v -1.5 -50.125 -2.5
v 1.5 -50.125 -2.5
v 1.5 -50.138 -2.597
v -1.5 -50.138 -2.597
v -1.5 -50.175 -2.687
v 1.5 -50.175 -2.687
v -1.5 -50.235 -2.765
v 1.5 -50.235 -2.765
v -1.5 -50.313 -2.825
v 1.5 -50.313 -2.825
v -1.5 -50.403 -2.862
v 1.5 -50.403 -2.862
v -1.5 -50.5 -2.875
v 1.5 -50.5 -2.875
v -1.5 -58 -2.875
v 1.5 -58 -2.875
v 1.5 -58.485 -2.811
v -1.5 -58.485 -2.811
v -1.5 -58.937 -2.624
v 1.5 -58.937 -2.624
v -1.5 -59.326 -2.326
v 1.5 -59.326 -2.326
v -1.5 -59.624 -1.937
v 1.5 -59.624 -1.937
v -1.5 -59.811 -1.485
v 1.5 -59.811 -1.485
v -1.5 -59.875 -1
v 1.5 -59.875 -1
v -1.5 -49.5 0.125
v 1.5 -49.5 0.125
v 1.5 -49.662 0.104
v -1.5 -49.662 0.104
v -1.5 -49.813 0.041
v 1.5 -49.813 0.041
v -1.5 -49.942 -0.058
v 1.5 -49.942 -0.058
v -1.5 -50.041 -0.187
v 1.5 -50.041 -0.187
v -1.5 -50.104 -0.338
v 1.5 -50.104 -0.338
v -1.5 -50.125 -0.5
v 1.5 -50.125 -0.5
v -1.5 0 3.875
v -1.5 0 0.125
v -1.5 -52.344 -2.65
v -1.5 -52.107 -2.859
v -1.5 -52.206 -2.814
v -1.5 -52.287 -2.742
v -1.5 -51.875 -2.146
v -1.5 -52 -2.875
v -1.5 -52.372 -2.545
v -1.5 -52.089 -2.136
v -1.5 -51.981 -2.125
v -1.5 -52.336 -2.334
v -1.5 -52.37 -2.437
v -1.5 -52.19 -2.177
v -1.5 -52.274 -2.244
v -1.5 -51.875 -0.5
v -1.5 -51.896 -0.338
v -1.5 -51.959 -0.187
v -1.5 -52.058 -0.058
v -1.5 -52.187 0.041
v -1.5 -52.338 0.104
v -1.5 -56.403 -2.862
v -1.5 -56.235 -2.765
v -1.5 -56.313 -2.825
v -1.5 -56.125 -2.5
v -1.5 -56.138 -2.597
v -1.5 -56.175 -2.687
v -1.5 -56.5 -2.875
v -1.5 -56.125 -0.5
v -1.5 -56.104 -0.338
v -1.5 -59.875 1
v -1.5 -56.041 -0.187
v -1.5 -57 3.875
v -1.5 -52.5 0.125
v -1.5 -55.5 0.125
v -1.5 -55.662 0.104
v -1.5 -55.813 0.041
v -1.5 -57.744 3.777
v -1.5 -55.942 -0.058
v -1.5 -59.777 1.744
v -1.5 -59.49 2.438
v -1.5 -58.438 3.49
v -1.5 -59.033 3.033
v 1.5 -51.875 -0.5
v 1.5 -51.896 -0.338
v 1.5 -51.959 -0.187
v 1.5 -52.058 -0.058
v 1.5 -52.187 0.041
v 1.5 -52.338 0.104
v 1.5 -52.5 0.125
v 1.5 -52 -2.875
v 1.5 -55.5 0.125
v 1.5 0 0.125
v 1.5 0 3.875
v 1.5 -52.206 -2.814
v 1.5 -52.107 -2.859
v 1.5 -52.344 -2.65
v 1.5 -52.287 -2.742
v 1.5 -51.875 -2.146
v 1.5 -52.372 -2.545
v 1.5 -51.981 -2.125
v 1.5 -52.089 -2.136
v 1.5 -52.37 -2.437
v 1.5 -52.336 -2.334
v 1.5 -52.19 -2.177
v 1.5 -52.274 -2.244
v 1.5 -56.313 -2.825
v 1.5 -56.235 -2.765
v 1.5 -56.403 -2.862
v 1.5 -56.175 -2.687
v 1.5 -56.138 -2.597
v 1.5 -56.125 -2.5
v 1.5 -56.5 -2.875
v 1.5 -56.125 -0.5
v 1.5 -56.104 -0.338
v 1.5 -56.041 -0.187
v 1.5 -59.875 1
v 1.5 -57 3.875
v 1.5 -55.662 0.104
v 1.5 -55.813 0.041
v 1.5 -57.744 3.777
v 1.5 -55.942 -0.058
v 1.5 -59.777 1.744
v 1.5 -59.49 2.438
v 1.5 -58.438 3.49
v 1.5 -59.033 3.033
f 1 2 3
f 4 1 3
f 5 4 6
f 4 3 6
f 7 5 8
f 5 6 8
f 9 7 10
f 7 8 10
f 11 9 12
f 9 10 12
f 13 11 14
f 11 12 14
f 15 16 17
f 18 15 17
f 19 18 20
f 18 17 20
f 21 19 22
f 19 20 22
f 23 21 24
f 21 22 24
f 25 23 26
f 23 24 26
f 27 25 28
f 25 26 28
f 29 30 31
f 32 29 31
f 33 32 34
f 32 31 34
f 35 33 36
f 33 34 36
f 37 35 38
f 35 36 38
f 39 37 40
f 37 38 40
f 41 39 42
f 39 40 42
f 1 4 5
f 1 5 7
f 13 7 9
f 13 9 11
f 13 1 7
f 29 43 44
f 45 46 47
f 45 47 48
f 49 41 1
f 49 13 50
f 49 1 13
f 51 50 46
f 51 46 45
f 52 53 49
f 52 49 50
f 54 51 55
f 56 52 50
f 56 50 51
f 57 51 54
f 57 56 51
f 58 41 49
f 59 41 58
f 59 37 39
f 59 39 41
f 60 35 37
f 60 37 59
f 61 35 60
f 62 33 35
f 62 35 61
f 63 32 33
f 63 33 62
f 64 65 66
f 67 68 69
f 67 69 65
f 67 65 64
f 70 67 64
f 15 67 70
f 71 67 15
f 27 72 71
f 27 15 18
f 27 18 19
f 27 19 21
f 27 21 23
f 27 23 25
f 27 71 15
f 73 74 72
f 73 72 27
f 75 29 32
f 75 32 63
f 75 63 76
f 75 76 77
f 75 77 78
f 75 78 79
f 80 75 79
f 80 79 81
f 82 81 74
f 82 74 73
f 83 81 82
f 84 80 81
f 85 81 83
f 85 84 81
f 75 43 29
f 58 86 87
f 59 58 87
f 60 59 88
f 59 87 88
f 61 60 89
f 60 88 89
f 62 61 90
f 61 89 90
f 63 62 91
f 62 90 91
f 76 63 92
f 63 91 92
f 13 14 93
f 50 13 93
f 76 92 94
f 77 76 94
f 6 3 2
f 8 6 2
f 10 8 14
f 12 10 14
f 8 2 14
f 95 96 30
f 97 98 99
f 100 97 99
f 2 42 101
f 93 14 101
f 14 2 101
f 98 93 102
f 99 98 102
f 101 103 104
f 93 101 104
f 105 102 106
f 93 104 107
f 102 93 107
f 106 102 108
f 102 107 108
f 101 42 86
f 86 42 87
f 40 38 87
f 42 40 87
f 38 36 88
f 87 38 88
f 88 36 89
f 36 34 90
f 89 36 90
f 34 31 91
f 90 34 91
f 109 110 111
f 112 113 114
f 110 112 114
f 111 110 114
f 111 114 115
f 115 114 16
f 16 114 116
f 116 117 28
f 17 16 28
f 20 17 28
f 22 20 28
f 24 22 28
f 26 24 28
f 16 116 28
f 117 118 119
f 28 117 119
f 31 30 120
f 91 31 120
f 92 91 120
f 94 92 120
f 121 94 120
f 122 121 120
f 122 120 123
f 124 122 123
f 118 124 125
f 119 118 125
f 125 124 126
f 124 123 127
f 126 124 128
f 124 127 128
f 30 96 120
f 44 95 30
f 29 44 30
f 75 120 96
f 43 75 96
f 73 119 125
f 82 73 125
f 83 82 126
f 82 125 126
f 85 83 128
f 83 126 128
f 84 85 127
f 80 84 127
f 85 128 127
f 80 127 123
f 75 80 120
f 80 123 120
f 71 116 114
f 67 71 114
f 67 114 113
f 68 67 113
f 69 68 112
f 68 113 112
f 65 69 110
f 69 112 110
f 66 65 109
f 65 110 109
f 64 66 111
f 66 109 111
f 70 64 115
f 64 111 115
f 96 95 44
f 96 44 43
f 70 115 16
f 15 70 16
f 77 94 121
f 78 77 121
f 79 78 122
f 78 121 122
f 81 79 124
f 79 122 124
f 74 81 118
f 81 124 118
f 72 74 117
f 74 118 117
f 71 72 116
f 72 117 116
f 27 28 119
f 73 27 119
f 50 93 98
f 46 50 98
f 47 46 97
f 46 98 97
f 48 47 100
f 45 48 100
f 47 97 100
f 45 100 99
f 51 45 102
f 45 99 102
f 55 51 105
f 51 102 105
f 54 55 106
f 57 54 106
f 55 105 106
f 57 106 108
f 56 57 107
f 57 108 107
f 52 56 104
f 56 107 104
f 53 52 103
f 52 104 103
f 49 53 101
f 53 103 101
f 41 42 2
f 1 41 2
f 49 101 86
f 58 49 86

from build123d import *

# Parameters (mm, degrees)
F0_W     = 2
F0_H     = 2
F1_DEPTH = 1.5
F2_R     = 0.5
F5_DEPTH = 3
F6_W     = 70.54612
F6_H     = 32.912751
F7_DEPTH = 3.001


with BuildPart() as f1:
    # F0 (on Right) → F1 (new body, symmetric)
    with BuildSketch(Plane.YZ):
        with BuildLine():
            Line((-50, 0), (0, 0))
            Line((0, 0), (0, 4))
            Line((0, 4), (-57, 4))
            ThreePointArc((-57, 4), (-59.12132, 3.12132), (-60, 1))
            Line((-60, 1), (-60, 0))
            Line((-60, 0), (-56, 0))
            Line((-56, 0), (-52, 0))
            Line((-52, 0), (-50, 0))
        make_face()
        with Locations((-51, -1)):
            Rectangle(F0_W, F0_H)
        with BuildLine():
            Line((-50, -2.5), (-50, -2))
            Line((-50, -2), (-52, -2))
            Line((-52, -2), (-52, -3))
            Line((-52, -3), (-50.5, -3))
            ThreePointArc((-50.5, -3), (-50.146447, -2.853553), (-50, -2.5))
        make_face()
        with BuildLine():
            Line((-56, -2.5), (-56, 0))
            Line((-56, 0), (-60, 0))
            Line((-60, 0), (-60, -1))
            ThreePointArc((-60, -1), (-59.414214, -2.414214), (-58, -3))
            Line((-58, -3), (-56.5, -3))
            ThreePointArc((-56.5, -3), (-56.146447, -2.853553), (-56, -2.5))
        make_face()
        with BuildLine():
            Line((-52, -3), (-52, -2))
            ThreePointArc((-52, -2), (-52.5, -2.5), (-52, -3))
        make_face()
    extrude(amount=F1_DEPTH, both=True)

    # F2
    f2_edges = [f1.edges().sort_by_distance(p)[0] for p in [
        (0, -56, 0),
        (0, -52, 0),
        (0, -50, 0),
    ]]
    fillet(f2_edges, radius=F2_R)

    # F3: F1 across face


with BuildPart() as f1_1:
    add(f1.part)
    add(f1.part.mirror(Plane(origin=(0, 0, 2), x_dir=(-1, 0, 0), z_dir=(0, 1, 0))))

    # F4 (on face) → F5 (cut, through all)
    with BuildSketch(Plane.YZ.offset(1.5)):
        with BuildLine():
            Line((57, 4), (-57, 4))
            ThreePointArc((-57, 4), (-59.12132, 3.12132), (-60, 1))
            Line((-60, 1), (-60, -1))
            ThreePointArc((-60, -1), (-59.414214, -2.414214), (-58, -3))
            Line((-58, -3), (-56.5, -3))
            ThreePointArc((-56.5, -3), (-56.146447, -2.853553), (-56, -2.5))
            Line((-56, -2.5), (-56, -0.5))
            ThreePointArc((-56, -0.5), (-55.853553, -0.146447), (-55.5, 0))
            Line((-55.5, 0), (-52.5, 0))
            ThreePointArc((-52.5, 0), (-52.146447, -0.146447), (-52, -0.5))
            Line((-52, -0.5), (-52, -2))
            ThreePointArc((-52, -2), (-52.5, -2.5), (-52, -3))
            Line((-52, -3), (-50.5, -3))
            ThreePointArc((-50.5, -3), (-50.146447, -2.853553), (-50, -2.5))
            Line((-50, -2.5), (-50, -0.5))
            ThreePointArc((-50, -0.5), (-49.853553, -0.146447), (-49.5, 0))
            Line((-49.5, 0), (49.5, 0))
            Line((49.5, 0), (49.5, 0.125))
            Line((49.5, 0.125), (-49.5, 0.125))
            ThreePointArc((-49.5, 0.125), (-49.941942, -0.058058), (-50.125, -0.5))
            Line((-50.125, -0.5), (-50.125, -2.5))
            ThreePointArc((-50.125, -2.5), (-50.234835, -2.765165), (-50.5, -2.875))
            Line((-50.5, -2.875), (-52, -2.875))
            ThreePointArc((-52, -2.875), (-52.369599, -2.436587), (-51.875, -2.146447))
            Line((-51.875, -2.146447), (-51.875, -0.5))
            ThreePointArc((-51.875, -0.5), (-52.058058, -0.058058), (-52.5, 0.125))
            Line((-52.5, 0.125), (-55.5, 0.125))
            ThreePointArc((-55.5, 0.125), (-55.941942, -0.058058), (-56.125, -0.5))
            Line((-56.125, -0.5), (-56.125, -2.5))
            ThreePointArc((-56.125, -2.5), (-56.234835, -2.765165), (-56.5, -2.875))
            Line((-56.5, -2.875), (-58, -2.875))
            ThreePointArc((-58, -2.875), (-59.325825, -2.325825), (-59.875, -1))
            Line((-59.875, -1), (-59.875, 1))
            ThreePointArc((-59.875, 1), (-59.032932, 3.032932), (-57, 3.875))
            Line((-57, 3.875), (57, 3.875))
            Line((57, 3.875), (57, 4))
        make_face()
    extrude(amount=-F5_DEPTH, mode=Mode.SUBTRACT)

    # F6 (on face) → F7 (cut, through all)
    with BuildSketch(Plane.YZ.offset(1.5)):
        with Locations((35.27306, -3.023576)):
            Rectangle(F6_W, F6_H)
    extrude(amount=-F7_DEPTH, mode=Mode.SUBTRACT)


solid = f1_1.part
